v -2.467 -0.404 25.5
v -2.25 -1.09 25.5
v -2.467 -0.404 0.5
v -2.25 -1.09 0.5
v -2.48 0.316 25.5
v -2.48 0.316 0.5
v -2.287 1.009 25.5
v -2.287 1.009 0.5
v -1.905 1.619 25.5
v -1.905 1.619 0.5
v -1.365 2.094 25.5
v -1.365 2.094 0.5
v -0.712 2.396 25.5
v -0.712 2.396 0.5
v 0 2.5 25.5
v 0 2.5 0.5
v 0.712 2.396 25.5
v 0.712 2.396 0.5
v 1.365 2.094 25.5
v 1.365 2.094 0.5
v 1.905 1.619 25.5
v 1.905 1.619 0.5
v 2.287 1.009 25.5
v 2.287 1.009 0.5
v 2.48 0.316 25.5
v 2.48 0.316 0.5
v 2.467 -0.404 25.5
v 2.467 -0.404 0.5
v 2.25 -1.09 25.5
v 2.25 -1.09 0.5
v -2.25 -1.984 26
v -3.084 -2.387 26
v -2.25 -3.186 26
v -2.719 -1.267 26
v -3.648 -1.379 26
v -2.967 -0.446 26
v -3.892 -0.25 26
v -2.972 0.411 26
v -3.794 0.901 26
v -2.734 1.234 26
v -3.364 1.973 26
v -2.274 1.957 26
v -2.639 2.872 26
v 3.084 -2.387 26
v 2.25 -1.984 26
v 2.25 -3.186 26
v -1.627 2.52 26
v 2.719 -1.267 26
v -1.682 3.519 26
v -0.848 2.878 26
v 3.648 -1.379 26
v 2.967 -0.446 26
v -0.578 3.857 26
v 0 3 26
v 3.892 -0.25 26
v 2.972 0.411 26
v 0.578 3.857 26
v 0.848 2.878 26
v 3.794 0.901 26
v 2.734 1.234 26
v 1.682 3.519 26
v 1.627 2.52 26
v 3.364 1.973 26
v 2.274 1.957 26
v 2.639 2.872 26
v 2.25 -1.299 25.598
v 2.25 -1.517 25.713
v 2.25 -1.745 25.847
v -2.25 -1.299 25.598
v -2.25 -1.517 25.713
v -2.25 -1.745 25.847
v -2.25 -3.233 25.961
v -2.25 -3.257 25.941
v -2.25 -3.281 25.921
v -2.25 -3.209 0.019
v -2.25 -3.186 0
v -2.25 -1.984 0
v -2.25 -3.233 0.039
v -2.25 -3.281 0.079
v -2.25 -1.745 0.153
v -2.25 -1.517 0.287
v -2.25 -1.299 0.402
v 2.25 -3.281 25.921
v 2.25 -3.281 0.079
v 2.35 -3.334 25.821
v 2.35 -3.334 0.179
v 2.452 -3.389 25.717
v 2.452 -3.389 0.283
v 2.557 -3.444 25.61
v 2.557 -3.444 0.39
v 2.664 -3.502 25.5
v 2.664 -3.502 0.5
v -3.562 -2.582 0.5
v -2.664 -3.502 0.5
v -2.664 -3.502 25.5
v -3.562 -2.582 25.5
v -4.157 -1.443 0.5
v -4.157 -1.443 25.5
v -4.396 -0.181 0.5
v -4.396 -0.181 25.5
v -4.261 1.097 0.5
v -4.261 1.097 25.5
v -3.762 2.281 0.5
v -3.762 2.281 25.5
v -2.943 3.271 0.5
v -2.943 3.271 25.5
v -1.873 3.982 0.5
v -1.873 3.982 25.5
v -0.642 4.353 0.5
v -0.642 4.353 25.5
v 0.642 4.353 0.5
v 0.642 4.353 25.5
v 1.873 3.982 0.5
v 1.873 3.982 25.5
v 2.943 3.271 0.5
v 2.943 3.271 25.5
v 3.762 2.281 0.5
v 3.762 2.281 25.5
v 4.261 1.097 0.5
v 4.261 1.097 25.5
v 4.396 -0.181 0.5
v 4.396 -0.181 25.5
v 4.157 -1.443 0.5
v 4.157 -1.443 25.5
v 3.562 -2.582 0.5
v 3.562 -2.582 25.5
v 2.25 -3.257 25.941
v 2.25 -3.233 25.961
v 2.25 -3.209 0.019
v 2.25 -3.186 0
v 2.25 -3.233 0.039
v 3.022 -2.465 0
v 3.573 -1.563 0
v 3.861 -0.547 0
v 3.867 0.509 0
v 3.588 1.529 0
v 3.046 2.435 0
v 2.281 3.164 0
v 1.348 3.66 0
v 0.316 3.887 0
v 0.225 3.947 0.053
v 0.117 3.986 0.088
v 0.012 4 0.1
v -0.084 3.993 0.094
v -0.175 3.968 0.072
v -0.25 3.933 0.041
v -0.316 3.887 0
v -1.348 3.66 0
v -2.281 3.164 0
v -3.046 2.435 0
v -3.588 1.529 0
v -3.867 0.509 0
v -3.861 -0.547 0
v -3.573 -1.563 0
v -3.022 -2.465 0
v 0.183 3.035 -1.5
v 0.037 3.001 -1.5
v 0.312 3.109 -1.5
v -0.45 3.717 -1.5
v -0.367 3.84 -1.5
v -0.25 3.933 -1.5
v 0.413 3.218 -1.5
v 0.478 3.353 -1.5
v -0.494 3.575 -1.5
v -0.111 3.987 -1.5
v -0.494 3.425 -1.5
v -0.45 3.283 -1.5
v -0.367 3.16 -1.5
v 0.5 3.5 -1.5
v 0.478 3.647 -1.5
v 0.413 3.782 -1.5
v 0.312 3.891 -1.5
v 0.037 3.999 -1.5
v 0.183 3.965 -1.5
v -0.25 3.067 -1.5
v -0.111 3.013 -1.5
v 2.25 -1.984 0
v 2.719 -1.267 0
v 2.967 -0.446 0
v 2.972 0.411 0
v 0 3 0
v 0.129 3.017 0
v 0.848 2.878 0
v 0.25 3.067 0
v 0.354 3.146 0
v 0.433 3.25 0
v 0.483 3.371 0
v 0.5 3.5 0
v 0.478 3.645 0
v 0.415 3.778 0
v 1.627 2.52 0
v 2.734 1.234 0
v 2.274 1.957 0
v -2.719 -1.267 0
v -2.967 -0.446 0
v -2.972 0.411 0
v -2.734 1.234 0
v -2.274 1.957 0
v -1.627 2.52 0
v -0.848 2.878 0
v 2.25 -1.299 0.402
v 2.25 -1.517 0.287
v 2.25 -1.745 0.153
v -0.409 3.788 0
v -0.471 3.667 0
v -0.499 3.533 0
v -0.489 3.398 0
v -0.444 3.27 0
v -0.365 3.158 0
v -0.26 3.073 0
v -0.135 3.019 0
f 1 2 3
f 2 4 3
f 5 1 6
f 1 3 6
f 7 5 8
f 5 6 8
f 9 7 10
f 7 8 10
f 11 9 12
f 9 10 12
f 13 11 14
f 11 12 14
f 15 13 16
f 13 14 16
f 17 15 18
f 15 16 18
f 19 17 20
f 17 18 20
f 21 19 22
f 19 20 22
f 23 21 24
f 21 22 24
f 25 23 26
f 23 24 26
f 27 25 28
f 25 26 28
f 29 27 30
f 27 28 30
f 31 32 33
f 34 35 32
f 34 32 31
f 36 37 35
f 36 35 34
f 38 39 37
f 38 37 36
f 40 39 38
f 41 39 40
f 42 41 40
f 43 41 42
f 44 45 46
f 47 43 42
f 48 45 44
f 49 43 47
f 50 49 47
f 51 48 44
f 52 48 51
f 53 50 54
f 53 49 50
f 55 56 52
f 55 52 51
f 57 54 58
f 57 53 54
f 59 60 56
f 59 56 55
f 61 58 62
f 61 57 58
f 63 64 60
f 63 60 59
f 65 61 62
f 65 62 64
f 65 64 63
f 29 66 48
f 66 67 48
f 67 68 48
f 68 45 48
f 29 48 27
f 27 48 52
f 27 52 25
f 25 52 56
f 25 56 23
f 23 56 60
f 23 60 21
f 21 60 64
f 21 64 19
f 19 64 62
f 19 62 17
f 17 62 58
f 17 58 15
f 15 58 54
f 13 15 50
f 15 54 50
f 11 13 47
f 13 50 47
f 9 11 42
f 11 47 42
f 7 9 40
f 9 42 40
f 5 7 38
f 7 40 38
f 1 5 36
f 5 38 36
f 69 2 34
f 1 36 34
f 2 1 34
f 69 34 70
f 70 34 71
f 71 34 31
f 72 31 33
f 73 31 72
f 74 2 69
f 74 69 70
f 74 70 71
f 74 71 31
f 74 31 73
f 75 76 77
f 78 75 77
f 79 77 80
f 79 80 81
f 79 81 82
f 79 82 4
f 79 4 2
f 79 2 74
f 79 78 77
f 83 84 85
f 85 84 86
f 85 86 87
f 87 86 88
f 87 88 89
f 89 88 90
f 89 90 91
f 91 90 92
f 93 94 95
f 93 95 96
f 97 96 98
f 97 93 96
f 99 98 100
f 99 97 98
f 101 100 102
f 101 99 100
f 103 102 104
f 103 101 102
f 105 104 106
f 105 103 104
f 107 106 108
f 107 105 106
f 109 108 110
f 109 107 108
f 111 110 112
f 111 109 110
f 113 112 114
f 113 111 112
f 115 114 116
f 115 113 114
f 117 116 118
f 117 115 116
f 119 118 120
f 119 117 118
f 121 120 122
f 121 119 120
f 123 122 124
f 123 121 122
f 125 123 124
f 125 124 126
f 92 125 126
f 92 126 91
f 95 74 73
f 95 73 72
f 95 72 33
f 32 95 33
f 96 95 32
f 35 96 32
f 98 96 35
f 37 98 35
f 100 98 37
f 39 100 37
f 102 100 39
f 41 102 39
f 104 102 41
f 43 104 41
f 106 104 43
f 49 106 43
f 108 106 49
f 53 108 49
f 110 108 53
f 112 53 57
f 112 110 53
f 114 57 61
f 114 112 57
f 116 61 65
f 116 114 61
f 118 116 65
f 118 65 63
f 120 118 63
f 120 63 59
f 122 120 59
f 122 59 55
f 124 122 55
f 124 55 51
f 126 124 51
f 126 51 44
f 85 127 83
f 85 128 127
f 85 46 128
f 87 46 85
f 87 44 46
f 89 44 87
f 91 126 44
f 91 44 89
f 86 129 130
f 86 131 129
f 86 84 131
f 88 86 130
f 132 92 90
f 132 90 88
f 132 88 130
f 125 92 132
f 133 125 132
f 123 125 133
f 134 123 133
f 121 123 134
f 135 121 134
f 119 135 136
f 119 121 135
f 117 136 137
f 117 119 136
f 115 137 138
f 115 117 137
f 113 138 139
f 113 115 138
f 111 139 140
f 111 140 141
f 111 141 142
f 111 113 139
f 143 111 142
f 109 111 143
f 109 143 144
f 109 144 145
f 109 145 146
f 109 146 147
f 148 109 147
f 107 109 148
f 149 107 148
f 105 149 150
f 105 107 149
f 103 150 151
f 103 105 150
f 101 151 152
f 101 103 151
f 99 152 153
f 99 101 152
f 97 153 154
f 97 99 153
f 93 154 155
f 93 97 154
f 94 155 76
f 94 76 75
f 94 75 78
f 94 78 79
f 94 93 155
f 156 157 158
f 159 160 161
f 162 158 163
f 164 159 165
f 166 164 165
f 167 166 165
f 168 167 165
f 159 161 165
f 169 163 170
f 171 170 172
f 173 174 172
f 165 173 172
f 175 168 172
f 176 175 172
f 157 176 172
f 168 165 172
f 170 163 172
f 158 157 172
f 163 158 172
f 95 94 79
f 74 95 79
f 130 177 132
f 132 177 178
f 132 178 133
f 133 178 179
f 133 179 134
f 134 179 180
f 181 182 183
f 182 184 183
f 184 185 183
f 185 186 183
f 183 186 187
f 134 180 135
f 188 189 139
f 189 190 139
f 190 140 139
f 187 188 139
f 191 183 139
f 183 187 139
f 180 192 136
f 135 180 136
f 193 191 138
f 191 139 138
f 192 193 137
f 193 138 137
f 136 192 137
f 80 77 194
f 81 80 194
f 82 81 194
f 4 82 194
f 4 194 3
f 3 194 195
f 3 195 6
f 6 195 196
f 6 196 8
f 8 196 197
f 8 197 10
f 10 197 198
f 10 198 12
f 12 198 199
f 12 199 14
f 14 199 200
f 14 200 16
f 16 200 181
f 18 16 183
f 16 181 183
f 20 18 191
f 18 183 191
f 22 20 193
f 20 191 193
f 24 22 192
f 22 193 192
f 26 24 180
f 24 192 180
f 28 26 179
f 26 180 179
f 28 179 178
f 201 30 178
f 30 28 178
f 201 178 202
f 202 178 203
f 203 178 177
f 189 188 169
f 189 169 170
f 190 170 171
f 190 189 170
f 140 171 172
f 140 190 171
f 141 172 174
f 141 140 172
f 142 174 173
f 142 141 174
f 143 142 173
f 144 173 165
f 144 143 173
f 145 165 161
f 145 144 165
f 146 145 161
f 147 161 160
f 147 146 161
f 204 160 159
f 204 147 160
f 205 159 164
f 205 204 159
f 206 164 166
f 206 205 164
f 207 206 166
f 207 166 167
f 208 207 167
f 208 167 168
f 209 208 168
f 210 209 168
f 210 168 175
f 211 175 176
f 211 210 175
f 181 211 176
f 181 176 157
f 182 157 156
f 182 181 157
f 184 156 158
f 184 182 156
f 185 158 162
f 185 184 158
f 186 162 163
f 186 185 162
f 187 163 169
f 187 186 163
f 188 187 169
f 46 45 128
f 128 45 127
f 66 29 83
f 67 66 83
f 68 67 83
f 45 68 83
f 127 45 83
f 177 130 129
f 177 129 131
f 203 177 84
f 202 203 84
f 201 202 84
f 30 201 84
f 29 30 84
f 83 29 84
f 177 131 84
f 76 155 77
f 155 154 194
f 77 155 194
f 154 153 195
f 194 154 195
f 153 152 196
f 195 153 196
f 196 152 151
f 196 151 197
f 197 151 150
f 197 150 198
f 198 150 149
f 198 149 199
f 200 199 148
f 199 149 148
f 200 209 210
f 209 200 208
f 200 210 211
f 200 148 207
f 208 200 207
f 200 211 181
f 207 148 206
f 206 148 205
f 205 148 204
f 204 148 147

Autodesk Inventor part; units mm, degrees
ref_plane "YZ Plane" through (0, 0, 0) normal (1, 0, 0) x (0, 1, 0)
ref_plane "XZ Plane" through (0, 0, 0) normal (0, 1, 0) x (-1, 0, 0)
ref_plane "XY Plane" through (0, 0, 0) normal (0, 0, 1) x (1, 0, 0)
sketch "Sketch1" plane through (0, 0, 0) normal (0, 0, 1) x (1, 0, 0)
  line L0 (0, 6.16) -> (0, -6.16) construction
  line L1 (-6.16, 0) -> (6.16, 0) construction
  circle A0 centre (0, 0) radius 4.4
  circle A1 centre (0, 0) radius 2.5
  circle A2 centre (0, 3.5) radius 0.5
  line L2 (-2.25, -1.0897) -> (-2.25, -3.7812)
  line L3 (2.25, -1.0897) -> (2.25, -3.7812)
  point P0 (-2.25, -2.4355)
  dimension "d4" = 8.8
  dimension "d5" = 5
  dimension "d6" = 3.5
  dimension "d7" = 1
  dimension "d16" = 4.5
extrude "Extrusion3" add sketch "Sketch1" along normal blind 26 contours A0 L3 A1 L2 | A2 picked at (-2.534, -2.6638)
extrude "Extrusion4" add sketch "Sketch1" against normal blind 1.5 contours A2
chamfer "Chamfer1" distance 0.5 angle 45 4 edges at (0, 4.4, 0) (0, 2.5, 0) (0, 2.5, 26) (0, 4.4, 26)
chamfer "Chamfer2" distance 0.5 angle 45 2 edges at (2.25, -3.7812, 13) (-2.25, -3.7812, 13)
properties part number "Adjustment tool" material "ALMg4,5Mn-5083-(D54S)"
